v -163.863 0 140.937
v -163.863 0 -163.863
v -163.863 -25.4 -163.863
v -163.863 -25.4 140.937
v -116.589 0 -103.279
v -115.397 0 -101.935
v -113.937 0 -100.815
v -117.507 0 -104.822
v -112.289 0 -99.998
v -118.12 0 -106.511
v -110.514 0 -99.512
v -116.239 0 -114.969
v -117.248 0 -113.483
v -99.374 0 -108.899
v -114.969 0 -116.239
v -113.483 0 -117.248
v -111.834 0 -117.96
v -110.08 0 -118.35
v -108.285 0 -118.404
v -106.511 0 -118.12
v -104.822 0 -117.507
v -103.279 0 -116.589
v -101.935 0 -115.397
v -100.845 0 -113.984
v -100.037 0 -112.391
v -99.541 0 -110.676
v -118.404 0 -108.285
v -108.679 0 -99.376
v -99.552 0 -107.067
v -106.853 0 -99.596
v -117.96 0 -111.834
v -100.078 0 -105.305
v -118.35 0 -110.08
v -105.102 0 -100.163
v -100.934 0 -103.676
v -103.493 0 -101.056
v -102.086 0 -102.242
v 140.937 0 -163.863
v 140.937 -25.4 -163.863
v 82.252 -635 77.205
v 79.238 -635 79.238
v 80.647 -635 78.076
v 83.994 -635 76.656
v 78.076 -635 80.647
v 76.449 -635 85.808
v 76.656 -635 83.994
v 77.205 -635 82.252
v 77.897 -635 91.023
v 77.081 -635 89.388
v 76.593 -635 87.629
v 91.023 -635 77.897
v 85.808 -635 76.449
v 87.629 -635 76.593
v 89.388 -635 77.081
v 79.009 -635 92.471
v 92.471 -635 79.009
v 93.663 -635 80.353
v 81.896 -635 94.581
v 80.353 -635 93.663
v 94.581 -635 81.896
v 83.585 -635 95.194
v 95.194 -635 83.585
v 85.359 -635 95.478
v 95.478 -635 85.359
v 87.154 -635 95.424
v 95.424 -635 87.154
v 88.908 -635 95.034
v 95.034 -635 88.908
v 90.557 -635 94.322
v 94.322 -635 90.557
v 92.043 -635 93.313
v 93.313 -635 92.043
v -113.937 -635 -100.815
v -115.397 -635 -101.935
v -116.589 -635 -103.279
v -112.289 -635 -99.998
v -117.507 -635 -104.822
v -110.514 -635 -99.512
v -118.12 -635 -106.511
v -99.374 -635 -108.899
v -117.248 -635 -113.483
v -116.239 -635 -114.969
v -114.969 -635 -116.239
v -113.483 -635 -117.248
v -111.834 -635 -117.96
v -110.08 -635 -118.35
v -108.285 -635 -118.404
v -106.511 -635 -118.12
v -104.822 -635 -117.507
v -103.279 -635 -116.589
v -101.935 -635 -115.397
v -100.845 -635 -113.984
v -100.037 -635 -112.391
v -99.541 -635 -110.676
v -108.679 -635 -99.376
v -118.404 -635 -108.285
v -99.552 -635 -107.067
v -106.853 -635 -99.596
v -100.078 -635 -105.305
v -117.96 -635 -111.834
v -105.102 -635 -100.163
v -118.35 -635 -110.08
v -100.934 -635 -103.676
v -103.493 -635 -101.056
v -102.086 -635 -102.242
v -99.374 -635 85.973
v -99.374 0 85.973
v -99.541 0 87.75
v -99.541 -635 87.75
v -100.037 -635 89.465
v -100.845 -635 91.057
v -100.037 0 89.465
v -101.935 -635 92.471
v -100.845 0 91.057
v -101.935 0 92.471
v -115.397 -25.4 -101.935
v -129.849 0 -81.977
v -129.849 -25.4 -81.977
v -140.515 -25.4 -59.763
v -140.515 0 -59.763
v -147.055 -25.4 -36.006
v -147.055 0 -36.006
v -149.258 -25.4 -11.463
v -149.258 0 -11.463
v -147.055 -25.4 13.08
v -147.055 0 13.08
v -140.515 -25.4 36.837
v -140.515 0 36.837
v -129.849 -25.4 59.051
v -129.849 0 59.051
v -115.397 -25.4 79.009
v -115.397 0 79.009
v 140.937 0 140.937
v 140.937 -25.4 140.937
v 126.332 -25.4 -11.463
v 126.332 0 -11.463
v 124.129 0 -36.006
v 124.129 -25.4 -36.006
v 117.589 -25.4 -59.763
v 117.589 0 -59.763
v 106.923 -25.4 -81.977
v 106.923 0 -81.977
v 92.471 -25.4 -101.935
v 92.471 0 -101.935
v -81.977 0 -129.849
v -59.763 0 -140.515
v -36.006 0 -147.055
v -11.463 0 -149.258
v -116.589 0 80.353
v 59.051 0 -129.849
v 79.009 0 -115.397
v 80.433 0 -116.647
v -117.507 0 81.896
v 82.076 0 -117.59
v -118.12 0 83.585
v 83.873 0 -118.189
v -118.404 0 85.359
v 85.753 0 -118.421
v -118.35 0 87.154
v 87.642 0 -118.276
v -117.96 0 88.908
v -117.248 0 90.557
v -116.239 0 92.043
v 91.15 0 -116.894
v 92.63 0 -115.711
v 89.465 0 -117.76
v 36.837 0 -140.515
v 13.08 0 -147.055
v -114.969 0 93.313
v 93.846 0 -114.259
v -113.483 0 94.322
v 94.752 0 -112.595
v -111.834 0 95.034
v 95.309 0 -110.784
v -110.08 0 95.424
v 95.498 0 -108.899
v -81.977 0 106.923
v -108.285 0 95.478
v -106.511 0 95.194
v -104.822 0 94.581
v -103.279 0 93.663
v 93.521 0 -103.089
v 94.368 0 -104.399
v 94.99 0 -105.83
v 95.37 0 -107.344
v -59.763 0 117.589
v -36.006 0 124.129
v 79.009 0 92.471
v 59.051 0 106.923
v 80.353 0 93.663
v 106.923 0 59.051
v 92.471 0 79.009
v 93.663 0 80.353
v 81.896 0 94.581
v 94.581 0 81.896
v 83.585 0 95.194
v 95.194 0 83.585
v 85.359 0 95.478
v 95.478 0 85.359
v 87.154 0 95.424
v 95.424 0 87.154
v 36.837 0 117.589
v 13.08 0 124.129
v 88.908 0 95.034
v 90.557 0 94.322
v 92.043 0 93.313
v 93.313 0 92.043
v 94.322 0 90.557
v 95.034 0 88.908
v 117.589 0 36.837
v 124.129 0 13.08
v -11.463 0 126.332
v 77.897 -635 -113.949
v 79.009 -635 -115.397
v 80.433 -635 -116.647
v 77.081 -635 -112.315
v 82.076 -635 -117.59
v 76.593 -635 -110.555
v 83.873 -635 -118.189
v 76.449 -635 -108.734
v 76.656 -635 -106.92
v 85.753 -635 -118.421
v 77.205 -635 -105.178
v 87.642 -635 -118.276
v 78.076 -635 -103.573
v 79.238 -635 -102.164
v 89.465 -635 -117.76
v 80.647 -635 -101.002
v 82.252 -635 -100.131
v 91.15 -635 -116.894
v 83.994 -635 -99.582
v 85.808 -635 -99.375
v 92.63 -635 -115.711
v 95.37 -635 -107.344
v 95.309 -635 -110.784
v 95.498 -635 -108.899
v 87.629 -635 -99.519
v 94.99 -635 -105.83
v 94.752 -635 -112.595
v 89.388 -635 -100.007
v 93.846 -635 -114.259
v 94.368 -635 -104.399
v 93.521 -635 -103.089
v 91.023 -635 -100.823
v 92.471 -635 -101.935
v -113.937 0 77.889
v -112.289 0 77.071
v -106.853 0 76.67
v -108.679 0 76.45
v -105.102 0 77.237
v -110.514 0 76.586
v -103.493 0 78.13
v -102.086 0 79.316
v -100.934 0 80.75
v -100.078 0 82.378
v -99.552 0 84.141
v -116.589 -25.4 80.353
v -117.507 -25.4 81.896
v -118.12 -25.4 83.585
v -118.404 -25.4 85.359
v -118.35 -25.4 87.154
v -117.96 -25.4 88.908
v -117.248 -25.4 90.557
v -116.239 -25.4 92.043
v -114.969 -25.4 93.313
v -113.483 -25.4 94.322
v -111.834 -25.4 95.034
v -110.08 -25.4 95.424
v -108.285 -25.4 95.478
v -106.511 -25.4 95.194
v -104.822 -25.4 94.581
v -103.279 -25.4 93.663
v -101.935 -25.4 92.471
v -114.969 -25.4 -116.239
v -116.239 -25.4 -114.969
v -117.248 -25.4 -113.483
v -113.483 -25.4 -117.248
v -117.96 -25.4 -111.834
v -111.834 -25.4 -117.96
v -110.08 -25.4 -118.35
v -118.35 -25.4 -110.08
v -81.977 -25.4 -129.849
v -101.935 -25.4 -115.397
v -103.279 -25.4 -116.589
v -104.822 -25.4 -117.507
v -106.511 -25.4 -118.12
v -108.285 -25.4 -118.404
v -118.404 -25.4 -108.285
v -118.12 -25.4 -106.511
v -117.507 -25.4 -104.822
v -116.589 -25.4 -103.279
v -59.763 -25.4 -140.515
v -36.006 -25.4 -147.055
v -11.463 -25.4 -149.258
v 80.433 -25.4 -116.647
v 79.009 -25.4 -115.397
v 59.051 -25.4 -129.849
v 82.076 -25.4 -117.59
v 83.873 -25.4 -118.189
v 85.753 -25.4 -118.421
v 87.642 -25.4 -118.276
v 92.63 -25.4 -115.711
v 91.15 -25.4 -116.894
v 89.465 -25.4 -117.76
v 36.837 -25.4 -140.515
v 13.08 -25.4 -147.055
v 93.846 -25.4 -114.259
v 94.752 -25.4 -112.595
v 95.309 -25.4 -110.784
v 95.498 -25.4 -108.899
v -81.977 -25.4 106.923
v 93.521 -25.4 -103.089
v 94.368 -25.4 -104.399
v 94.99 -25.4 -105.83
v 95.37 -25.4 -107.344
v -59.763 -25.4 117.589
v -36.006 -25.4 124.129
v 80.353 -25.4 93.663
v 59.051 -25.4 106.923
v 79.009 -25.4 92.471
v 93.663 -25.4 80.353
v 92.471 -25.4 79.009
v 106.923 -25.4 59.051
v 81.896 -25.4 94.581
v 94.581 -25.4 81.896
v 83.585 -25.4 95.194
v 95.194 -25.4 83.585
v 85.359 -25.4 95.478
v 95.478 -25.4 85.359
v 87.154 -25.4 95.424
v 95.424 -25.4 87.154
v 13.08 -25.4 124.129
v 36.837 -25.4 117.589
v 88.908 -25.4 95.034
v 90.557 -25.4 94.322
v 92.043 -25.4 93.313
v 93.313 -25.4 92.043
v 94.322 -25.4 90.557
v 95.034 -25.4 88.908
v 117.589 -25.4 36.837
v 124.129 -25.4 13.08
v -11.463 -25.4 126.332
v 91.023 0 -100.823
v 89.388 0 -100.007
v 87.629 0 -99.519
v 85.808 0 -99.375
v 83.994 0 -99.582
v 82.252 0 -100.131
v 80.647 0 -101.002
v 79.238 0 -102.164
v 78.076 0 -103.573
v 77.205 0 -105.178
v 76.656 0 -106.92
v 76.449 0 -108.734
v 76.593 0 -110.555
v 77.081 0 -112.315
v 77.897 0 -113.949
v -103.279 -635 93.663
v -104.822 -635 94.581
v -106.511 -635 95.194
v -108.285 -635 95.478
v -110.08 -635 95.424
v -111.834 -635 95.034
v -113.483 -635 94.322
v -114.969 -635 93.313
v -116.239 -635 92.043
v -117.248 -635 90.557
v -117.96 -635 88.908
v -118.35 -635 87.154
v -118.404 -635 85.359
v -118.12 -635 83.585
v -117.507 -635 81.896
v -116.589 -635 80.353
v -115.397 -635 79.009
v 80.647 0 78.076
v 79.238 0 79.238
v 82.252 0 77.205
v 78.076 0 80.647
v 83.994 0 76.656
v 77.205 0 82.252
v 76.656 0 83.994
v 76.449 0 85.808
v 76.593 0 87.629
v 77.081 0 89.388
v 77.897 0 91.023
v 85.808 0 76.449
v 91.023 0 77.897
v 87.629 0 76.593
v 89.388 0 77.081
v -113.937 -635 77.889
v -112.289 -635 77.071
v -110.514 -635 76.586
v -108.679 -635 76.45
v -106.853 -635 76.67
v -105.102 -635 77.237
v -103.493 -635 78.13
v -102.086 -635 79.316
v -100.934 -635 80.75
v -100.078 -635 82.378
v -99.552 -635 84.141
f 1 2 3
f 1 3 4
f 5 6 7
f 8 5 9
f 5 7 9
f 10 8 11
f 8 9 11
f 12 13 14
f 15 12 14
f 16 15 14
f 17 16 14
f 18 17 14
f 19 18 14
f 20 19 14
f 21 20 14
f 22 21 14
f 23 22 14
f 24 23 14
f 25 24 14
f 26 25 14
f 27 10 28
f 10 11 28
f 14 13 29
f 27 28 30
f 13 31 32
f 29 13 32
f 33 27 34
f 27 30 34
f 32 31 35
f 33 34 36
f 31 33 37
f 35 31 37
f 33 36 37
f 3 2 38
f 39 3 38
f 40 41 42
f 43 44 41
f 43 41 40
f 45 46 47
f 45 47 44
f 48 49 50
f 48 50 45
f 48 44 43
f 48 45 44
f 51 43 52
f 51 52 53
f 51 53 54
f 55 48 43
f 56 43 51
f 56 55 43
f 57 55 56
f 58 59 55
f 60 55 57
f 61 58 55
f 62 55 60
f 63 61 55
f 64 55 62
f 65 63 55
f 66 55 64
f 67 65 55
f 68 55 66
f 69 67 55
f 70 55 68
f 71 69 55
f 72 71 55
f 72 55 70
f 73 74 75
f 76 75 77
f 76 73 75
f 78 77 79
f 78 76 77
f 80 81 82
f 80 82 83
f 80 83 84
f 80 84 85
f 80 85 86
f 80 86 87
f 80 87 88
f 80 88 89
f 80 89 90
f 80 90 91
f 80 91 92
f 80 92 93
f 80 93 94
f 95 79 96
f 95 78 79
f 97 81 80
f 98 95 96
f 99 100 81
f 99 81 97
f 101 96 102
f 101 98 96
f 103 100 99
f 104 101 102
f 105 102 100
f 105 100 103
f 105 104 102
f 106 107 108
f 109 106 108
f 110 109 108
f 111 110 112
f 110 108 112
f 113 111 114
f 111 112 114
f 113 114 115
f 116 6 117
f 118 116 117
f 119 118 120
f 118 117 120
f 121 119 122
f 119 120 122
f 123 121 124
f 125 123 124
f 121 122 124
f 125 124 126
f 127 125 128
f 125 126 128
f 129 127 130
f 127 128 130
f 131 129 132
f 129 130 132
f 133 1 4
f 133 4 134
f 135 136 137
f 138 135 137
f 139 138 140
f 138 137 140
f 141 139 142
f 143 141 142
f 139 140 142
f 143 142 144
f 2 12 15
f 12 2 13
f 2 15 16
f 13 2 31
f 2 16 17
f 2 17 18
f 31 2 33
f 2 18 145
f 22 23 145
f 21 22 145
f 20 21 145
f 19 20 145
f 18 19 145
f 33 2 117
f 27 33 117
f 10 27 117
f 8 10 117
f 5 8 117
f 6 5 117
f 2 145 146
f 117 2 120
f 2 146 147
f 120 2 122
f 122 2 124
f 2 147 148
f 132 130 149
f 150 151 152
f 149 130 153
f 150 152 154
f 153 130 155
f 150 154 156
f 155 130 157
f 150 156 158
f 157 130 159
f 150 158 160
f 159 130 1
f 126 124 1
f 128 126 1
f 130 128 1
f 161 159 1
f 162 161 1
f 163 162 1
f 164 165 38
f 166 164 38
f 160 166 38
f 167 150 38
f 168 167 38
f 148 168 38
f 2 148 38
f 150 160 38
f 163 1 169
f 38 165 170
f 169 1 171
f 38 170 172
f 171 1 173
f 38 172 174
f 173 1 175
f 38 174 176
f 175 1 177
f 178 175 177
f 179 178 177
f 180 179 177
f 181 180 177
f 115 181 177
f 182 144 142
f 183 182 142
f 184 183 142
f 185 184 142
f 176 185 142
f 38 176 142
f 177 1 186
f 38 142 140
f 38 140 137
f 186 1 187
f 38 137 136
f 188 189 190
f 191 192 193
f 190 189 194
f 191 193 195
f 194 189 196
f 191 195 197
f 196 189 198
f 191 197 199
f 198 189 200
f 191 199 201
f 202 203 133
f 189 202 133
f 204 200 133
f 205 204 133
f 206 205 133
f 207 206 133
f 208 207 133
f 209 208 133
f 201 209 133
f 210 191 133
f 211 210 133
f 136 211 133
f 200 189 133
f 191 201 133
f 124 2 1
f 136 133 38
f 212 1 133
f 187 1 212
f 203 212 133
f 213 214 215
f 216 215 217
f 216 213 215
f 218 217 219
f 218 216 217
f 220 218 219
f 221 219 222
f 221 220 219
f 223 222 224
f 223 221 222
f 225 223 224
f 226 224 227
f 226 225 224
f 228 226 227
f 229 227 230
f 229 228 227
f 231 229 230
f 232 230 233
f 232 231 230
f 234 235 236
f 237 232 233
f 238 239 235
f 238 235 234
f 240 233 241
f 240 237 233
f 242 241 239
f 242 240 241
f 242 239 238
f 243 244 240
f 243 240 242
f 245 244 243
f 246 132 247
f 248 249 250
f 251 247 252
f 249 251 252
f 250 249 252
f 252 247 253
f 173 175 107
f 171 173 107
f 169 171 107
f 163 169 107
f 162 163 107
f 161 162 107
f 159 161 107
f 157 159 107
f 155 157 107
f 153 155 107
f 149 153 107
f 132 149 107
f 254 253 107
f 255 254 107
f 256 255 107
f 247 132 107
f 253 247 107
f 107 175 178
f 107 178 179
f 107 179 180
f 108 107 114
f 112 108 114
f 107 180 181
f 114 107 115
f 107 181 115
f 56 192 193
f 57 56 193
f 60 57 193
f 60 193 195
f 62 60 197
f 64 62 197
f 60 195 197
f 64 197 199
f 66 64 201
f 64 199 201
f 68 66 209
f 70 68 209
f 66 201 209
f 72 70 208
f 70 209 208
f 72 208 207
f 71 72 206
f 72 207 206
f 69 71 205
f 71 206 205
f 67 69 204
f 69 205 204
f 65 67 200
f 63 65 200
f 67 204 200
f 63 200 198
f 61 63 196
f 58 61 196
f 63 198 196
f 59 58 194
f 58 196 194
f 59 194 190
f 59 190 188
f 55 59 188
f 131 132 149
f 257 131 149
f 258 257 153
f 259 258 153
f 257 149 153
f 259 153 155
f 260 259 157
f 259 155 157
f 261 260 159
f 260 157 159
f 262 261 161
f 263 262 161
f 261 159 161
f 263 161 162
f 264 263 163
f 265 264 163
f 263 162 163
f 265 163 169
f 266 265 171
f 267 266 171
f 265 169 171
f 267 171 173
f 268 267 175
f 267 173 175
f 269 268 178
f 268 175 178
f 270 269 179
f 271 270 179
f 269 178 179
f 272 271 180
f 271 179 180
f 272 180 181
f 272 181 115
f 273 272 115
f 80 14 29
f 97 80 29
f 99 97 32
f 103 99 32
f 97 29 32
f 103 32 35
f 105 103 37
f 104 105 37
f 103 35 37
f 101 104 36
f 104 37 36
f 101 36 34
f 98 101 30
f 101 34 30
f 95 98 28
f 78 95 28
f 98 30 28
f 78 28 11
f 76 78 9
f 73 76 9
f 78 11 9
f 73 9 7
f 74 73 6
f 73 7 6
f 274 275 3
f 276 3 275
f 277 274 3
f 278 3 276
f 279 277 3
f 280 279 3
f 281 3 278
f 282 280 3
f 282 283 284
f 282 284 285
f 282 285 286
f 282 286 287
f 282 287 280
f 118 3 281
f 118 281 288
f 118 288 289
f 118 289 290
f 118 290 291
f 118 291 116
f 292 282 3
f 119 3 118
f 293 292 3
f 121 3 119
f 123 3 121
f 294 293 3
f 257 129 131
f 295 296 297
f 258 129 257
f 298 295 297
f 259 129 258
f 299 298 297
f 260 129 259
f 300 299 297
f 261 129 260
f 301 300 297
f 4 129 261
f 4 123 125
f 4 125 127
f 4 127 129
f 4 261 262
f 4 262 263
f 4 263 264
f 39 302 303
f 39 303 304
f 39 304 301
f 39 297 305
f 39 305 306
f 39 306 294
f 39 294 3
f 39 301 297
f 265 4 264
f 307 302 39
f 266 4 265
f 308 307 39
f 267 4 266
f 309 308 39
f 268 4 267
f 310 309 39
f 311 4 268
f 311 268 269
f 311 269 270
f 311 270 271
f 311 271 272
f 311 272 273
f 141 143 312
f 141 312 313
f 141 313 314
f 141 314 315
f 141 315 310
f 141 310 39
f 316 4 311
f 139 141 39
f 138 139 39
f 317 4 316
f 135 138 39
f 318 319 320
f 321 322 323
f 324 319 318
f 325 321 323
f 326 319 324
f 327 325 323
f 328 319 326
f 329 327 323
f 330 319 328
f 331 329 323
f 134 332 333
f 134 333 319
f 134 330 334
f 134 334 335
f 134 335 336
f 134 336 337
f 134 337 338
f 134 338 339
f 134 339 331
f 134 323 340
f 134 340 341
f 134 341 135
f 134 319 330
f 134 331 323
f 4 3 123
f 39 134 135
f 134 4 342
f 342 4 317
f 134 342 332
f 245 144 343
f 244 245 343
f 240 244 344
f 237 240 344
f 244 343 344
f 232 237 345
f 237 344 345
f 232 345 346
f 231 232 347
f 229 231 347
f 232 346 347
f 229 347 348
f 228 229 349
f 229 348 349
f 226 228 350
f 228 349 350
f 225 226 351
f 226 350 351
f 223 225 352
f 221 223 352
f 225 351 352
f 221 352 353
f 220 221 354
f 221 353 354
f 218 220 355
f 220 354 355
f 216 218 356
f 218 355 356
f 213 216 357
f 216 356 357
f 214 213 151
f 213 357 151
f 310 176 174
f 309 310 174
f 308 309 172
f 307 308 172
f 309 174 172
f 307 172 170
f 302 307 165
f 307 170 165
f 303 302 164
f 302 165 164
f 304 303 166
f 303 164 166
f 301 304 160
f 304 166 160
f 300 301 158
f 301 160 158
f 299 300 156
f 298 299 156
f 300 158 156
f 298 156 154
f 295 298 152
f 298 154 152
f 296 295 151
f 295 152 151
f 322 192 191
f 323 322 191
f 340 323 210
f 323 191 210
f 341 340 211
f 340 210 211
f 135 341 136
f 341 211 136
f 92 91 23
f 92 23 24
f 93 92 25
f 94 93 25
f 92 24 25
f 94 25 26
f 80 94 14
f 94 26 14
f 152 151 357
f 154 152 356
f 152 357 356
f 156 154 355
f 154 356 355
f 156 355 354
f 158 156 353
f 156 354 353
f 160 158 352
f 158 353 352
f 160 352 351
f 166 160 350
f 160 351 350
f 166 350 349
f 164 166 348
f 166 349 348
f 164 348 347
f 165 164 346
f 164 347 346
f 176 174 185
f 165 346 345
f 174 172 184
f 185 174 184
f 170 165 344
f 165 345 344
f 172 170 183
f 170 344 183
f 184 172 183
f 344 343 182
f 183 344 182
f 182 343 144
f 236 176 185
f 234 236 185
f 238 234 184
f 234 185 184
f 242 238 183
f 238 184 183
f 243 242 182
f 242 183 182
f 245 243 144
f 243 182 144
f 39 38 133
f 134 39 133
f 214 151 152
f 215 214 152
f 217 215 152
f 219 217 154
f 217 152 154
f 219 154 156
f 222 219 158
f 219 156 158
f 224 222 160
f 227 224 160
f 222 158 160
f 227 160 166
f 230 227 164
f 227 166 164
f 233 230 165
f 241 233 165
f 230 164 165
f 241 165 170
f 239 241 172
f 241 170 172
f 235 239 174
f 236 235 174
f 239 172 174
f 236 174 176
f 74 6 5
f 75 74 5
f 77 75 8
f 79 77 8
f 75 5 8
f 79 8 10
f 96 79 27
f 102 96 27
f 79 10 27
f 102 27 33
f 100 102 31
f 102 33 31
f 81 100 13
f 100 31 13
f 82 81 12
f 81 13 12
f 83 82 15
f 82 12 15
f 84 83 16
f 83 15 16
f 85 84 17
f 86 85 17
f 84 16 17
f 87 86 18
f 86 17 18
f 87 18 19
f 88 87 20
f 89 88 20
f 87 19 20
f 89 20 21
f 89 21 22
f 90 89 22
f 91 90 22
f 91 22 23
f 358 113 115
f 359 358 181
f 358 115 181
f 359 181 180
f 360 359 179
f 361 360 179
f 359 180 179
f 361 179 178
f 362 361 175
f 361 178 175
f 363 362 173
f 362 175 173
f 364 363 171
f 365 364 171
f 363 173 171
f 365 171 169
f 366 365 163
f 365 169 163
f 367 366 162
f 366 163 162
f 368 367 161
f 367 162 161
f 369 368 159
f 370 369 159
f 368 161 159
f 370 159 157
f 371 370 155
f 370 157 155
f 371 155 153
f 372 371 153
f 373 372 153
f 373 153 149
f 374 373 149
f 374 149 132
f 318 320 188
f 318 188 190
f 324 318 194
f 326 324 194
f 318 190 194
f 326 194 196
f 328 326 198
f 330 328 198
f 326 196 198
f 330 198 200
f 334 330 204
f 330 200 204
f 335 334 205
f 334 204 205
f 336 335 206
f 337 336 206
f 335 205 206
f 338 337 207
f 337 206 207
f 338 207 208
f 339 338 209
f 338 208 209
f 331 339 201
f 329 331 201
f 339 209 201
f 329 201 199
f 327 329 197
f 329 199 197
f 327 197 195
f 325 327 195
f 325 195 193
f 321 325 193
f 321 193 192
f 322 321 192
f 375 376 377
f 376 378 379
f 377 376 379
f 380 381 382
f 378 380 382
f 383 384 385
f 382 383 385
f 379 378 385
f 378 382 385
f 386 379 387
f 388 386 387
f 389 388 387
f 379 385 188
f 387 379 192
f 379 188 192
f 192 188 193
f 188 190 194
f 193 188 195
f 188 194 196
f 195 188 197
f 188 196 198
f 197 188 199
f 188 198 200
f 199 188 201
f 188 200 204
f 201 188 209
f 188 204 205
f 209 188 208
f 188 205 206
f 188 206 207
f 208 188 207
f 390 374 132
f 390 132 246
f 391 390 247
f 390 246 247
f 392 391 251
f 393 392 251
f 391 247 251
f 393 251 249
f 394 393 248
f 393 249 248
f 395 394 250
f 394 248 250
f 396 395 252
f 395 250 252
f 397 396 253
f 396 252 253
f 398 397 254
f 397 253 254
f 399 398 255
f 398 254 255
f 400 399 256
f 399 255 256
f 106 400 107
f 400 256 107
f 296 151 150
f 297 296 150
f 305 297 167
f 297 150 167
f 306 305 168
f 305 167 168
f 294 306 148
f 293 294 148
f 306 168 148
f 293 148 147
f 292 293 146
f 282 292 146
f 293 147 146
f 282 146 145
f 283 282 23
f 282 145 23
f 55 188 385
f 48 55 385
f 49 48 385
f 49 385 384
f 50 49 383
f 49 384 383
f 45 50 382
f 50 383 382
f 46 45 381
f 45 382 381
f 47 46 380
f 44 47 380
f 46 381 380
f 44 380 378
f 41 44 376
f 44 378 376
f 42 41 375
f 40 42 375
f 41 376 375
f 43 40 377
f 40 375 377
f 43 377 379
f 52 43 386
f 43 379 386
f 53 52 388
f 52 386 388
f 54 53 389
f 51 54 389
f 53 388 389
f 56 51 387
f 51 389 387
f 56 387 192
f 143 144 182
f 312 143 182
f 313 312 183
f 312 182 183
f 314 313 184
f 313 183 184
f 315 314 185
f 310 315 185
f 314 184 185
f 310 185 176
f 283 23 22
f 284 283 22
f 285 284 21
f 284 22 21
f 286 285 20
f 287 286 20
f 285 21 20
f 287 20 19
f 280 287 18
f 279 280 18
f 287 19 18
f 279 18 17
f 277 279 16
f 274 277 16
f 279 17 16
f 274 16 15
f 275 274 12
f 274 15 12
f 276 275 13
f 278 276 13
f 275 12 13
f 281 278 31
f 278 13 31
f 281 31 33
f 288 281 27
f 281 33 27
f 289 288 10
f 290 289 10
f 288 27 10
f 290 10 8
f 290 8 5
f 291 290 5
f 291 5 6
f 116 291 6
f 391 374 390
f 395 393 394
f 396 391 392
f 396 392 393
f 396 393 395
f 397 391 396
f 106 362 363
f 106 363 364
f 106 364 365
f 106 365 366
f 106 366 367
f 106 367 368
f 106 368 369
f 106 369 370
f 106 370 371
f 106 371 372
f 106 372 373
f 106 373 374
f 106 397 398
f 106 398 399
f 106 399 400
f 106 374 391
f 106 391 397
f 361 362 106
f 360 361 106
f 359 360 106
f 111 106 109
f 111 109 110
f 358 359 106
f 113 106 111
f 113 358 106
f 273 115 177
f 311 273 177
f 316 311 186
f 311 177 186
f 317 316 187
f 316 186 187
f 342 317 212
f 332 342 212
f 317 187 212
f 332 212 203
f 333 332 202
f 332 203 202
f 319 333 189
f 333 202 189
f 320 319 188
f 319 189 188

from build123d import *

# Parameters (mm, degrees)
F1_DEPTH = 635
F0_W     = 304.8
F0_H     = 304.8
F2_DEPTH = 25.4


with BuildPart() as f1:
    # F0 (on Front) → F1 (new body)
    with BuildSketch(Plane.XZ):
        with BuildLine():
            ThreePointArc((79.0087948248, 92.4711311021), (79.2375540094, 79.2375540094), (92.4711311021, 79.0087948248))
            ThreePointArc((92.4711311021, 79.0087948248), (85.9727461002, 85.9727461002), (79.0087948248, 92.4711311021))
        make_face()
        with BuildLine():
            ThreePointArc((79.0087948248, 92.4711311021), (85.9727461002, 85.9727461002), (92.4711311021, 79.0087948248))
            ThreePointArc((92.4711311021, 79.0087948248), (94.708384089, 82.1761352526), (95.4977461002, 85.9727461002))
            ThreePointArc((95.4977461002, 85.9727461002), (89.4651656842, 94.834384236), (79.0087948248, 92.4711311021))
        make_face()
    extrude(amount=F1_DEPTH)


with BuildPart() as f1b:
    # F0 (on Front) → F1, piece 2 (new body)
    with BuildSketch(Plane.XZ):
        with BuildLine():
            ThreePointArc((95.4977461002, -108.898811727), (94.708384089, -105.1022008793), (92.4711311021, -101.9348604515))
            ThreePointArc((92.4711311021, -101.9348604515), (85.9727461002, -108.898811727), (79.0087948248, -115.3971967289))
            ThreePointArc((79.0087948248, -115.3971967289), (89.4651656842, -117.7604498627), (95.4977461002, -108.898811727))
        make_face()
        with BuildLine():
            ThreePointArc((79.0087948248, -115.3971967289), (85.9727461002, -108.898811727), (92.4711311021, -101.9348604515))
            ThreePointArc((92.4711311021, -101.9348604515), (79.2375540094, -102.1636196362), (79.0087948248, -115.3971967289))
        make_face()
    extrude(amount=F1_DEPTH)


with BuildPart() as f1c:
    # F0 (on Front) → F1, piece 3 (new body)
    with BuildSketch(Plane.XZ):
        with BuildLine():
            ThreePointArc((-99.373811727, 85.9727461002), (-100.0371735912, 89.4651656842), (-101.9348604515, 92.4711311021))
            ThreePointArc((-101.9348604515, 92.4711311021), (-108.898811727, 85.9727461002), (-115.3971967289, 79.0087948248))
            ThreePointArc((-115.3971967289, 79.0087948248), (-105.1022008793, 77.2371081114), (-99.373811727, 85.9727461002))
        make_face()
        with BuildLine():
            ThreePointArc((-115.3971967289, 79.0087948248), (-108.898811727, 85.9727461002), (-101.9348604515, 92.4711311021))
            ThreePointArc((-101.9348604515, 92.4711311021), (-115.6340038178, 92.707938191), (-115.3971967289, 79.0087948248))
        make_face()
    extrude(amount=F1_DEPTH)


with BuildPart() as f1d:
    # F0 (on Front) → F1, piece 4 (new body)
    with BuildSketch(Plane.XZ):
        with BuildLine():
            ThreePointArc((-115.3971967289, -101.9348604515), (-115.6340038178, -115.6340038178), (-101.9348604515, -115.3971967289))
            ThreePointArc((-101.9348604515, -115.3971967289), (-108.898811727, -108.898811727), (-115.3971967289, -101.9348604515))
        make_face()
        with BuildLine():
            ThreePointArc((-115.3971967289, -101.9348604515), (-108.898811727, -108.898811727), (-101.9348604515, -115.3971967289))
            ThreePointArc((-101.9348604515, -115.3971967289), (-100.0371735912, -112.391231311), (-99.373811727, -108.898811727))
            ThreePointArc((-99.373811727, -108.898811727), (-105.1022008793, -100.1631737382), (-115.3971967289, -101.9348604515))
        make_face()
    extrude(amount=F1_DEPTH)


with BuildPart() as f2:
    # F0 (on Front) → F2 (new body)
    with BuildSketch(Plane.XZ):
        with Locations((-11.4630328134, -11.4630328134)):
            Rectangle(F0_W, F0_H)
        with BuildLine():
            ThreePointArc((92.4711311021, 79.0087948248), (117.5894180385, 36.8373497331), (126.3319671866, -11.4630328134))
            ThreePointArc((126.3319671866, -11.4630328134), (117.5894180385, -59.7634153598), (92.4711311021, -101.9348604515))
            ThreePointArc((92.4711311021, -101.9348604515), (94.708384089, -105.1022008793), (95.4977461002, -108.898811727))
            ThreePointArc((95.4977461002, -108.898811727), (89.4651656842, -117.7604498627), (79.0087948248, -115.3971967289))
            ThreePointArc((79.0087948248, -115.3971967289), (-11.4630328134, -149.2580328134), (-101.9348604515, -115.3971967289))
            ThreePointArc((-101.9348604515, -115.3971967289), (-115.6340038178, -115.6340038178), (-115.3971967289, -101.9348604515))
            ThreePointArc((-115.3971967289, -101.9348604515), (-149.2580328134, -11.4630328134), (-115.3971967289, 79.0087948248))
            ThreePointArc((-115.3971967289, 79.0087948248), (-115.6340038178, 92.707938191), (-101.9348604515, 92.4711311021))
            ThreePointArc((-101.9348604515, 92.4711311021), (-11.4630328134, 126.3319671866), (79.0087948248, 92.4711311021))
            ThreePointArc((79.0087948248, 92.4711311021), (89.4651656842, 94.834384236), (95.4977461002, 85.9727461002))
            ThreePointArc((95.4977461002, 85.9727461002), (94.708384089, 82.1761352526), (92.4711311021, 79.0087948248))
        make_face(mode=Mode.SUBTRACT)
    extrude(amount=F2_DEPTH)


solid = Compound([f1.part, f1b.part, f1c.part, f1d.part, f2.part])
